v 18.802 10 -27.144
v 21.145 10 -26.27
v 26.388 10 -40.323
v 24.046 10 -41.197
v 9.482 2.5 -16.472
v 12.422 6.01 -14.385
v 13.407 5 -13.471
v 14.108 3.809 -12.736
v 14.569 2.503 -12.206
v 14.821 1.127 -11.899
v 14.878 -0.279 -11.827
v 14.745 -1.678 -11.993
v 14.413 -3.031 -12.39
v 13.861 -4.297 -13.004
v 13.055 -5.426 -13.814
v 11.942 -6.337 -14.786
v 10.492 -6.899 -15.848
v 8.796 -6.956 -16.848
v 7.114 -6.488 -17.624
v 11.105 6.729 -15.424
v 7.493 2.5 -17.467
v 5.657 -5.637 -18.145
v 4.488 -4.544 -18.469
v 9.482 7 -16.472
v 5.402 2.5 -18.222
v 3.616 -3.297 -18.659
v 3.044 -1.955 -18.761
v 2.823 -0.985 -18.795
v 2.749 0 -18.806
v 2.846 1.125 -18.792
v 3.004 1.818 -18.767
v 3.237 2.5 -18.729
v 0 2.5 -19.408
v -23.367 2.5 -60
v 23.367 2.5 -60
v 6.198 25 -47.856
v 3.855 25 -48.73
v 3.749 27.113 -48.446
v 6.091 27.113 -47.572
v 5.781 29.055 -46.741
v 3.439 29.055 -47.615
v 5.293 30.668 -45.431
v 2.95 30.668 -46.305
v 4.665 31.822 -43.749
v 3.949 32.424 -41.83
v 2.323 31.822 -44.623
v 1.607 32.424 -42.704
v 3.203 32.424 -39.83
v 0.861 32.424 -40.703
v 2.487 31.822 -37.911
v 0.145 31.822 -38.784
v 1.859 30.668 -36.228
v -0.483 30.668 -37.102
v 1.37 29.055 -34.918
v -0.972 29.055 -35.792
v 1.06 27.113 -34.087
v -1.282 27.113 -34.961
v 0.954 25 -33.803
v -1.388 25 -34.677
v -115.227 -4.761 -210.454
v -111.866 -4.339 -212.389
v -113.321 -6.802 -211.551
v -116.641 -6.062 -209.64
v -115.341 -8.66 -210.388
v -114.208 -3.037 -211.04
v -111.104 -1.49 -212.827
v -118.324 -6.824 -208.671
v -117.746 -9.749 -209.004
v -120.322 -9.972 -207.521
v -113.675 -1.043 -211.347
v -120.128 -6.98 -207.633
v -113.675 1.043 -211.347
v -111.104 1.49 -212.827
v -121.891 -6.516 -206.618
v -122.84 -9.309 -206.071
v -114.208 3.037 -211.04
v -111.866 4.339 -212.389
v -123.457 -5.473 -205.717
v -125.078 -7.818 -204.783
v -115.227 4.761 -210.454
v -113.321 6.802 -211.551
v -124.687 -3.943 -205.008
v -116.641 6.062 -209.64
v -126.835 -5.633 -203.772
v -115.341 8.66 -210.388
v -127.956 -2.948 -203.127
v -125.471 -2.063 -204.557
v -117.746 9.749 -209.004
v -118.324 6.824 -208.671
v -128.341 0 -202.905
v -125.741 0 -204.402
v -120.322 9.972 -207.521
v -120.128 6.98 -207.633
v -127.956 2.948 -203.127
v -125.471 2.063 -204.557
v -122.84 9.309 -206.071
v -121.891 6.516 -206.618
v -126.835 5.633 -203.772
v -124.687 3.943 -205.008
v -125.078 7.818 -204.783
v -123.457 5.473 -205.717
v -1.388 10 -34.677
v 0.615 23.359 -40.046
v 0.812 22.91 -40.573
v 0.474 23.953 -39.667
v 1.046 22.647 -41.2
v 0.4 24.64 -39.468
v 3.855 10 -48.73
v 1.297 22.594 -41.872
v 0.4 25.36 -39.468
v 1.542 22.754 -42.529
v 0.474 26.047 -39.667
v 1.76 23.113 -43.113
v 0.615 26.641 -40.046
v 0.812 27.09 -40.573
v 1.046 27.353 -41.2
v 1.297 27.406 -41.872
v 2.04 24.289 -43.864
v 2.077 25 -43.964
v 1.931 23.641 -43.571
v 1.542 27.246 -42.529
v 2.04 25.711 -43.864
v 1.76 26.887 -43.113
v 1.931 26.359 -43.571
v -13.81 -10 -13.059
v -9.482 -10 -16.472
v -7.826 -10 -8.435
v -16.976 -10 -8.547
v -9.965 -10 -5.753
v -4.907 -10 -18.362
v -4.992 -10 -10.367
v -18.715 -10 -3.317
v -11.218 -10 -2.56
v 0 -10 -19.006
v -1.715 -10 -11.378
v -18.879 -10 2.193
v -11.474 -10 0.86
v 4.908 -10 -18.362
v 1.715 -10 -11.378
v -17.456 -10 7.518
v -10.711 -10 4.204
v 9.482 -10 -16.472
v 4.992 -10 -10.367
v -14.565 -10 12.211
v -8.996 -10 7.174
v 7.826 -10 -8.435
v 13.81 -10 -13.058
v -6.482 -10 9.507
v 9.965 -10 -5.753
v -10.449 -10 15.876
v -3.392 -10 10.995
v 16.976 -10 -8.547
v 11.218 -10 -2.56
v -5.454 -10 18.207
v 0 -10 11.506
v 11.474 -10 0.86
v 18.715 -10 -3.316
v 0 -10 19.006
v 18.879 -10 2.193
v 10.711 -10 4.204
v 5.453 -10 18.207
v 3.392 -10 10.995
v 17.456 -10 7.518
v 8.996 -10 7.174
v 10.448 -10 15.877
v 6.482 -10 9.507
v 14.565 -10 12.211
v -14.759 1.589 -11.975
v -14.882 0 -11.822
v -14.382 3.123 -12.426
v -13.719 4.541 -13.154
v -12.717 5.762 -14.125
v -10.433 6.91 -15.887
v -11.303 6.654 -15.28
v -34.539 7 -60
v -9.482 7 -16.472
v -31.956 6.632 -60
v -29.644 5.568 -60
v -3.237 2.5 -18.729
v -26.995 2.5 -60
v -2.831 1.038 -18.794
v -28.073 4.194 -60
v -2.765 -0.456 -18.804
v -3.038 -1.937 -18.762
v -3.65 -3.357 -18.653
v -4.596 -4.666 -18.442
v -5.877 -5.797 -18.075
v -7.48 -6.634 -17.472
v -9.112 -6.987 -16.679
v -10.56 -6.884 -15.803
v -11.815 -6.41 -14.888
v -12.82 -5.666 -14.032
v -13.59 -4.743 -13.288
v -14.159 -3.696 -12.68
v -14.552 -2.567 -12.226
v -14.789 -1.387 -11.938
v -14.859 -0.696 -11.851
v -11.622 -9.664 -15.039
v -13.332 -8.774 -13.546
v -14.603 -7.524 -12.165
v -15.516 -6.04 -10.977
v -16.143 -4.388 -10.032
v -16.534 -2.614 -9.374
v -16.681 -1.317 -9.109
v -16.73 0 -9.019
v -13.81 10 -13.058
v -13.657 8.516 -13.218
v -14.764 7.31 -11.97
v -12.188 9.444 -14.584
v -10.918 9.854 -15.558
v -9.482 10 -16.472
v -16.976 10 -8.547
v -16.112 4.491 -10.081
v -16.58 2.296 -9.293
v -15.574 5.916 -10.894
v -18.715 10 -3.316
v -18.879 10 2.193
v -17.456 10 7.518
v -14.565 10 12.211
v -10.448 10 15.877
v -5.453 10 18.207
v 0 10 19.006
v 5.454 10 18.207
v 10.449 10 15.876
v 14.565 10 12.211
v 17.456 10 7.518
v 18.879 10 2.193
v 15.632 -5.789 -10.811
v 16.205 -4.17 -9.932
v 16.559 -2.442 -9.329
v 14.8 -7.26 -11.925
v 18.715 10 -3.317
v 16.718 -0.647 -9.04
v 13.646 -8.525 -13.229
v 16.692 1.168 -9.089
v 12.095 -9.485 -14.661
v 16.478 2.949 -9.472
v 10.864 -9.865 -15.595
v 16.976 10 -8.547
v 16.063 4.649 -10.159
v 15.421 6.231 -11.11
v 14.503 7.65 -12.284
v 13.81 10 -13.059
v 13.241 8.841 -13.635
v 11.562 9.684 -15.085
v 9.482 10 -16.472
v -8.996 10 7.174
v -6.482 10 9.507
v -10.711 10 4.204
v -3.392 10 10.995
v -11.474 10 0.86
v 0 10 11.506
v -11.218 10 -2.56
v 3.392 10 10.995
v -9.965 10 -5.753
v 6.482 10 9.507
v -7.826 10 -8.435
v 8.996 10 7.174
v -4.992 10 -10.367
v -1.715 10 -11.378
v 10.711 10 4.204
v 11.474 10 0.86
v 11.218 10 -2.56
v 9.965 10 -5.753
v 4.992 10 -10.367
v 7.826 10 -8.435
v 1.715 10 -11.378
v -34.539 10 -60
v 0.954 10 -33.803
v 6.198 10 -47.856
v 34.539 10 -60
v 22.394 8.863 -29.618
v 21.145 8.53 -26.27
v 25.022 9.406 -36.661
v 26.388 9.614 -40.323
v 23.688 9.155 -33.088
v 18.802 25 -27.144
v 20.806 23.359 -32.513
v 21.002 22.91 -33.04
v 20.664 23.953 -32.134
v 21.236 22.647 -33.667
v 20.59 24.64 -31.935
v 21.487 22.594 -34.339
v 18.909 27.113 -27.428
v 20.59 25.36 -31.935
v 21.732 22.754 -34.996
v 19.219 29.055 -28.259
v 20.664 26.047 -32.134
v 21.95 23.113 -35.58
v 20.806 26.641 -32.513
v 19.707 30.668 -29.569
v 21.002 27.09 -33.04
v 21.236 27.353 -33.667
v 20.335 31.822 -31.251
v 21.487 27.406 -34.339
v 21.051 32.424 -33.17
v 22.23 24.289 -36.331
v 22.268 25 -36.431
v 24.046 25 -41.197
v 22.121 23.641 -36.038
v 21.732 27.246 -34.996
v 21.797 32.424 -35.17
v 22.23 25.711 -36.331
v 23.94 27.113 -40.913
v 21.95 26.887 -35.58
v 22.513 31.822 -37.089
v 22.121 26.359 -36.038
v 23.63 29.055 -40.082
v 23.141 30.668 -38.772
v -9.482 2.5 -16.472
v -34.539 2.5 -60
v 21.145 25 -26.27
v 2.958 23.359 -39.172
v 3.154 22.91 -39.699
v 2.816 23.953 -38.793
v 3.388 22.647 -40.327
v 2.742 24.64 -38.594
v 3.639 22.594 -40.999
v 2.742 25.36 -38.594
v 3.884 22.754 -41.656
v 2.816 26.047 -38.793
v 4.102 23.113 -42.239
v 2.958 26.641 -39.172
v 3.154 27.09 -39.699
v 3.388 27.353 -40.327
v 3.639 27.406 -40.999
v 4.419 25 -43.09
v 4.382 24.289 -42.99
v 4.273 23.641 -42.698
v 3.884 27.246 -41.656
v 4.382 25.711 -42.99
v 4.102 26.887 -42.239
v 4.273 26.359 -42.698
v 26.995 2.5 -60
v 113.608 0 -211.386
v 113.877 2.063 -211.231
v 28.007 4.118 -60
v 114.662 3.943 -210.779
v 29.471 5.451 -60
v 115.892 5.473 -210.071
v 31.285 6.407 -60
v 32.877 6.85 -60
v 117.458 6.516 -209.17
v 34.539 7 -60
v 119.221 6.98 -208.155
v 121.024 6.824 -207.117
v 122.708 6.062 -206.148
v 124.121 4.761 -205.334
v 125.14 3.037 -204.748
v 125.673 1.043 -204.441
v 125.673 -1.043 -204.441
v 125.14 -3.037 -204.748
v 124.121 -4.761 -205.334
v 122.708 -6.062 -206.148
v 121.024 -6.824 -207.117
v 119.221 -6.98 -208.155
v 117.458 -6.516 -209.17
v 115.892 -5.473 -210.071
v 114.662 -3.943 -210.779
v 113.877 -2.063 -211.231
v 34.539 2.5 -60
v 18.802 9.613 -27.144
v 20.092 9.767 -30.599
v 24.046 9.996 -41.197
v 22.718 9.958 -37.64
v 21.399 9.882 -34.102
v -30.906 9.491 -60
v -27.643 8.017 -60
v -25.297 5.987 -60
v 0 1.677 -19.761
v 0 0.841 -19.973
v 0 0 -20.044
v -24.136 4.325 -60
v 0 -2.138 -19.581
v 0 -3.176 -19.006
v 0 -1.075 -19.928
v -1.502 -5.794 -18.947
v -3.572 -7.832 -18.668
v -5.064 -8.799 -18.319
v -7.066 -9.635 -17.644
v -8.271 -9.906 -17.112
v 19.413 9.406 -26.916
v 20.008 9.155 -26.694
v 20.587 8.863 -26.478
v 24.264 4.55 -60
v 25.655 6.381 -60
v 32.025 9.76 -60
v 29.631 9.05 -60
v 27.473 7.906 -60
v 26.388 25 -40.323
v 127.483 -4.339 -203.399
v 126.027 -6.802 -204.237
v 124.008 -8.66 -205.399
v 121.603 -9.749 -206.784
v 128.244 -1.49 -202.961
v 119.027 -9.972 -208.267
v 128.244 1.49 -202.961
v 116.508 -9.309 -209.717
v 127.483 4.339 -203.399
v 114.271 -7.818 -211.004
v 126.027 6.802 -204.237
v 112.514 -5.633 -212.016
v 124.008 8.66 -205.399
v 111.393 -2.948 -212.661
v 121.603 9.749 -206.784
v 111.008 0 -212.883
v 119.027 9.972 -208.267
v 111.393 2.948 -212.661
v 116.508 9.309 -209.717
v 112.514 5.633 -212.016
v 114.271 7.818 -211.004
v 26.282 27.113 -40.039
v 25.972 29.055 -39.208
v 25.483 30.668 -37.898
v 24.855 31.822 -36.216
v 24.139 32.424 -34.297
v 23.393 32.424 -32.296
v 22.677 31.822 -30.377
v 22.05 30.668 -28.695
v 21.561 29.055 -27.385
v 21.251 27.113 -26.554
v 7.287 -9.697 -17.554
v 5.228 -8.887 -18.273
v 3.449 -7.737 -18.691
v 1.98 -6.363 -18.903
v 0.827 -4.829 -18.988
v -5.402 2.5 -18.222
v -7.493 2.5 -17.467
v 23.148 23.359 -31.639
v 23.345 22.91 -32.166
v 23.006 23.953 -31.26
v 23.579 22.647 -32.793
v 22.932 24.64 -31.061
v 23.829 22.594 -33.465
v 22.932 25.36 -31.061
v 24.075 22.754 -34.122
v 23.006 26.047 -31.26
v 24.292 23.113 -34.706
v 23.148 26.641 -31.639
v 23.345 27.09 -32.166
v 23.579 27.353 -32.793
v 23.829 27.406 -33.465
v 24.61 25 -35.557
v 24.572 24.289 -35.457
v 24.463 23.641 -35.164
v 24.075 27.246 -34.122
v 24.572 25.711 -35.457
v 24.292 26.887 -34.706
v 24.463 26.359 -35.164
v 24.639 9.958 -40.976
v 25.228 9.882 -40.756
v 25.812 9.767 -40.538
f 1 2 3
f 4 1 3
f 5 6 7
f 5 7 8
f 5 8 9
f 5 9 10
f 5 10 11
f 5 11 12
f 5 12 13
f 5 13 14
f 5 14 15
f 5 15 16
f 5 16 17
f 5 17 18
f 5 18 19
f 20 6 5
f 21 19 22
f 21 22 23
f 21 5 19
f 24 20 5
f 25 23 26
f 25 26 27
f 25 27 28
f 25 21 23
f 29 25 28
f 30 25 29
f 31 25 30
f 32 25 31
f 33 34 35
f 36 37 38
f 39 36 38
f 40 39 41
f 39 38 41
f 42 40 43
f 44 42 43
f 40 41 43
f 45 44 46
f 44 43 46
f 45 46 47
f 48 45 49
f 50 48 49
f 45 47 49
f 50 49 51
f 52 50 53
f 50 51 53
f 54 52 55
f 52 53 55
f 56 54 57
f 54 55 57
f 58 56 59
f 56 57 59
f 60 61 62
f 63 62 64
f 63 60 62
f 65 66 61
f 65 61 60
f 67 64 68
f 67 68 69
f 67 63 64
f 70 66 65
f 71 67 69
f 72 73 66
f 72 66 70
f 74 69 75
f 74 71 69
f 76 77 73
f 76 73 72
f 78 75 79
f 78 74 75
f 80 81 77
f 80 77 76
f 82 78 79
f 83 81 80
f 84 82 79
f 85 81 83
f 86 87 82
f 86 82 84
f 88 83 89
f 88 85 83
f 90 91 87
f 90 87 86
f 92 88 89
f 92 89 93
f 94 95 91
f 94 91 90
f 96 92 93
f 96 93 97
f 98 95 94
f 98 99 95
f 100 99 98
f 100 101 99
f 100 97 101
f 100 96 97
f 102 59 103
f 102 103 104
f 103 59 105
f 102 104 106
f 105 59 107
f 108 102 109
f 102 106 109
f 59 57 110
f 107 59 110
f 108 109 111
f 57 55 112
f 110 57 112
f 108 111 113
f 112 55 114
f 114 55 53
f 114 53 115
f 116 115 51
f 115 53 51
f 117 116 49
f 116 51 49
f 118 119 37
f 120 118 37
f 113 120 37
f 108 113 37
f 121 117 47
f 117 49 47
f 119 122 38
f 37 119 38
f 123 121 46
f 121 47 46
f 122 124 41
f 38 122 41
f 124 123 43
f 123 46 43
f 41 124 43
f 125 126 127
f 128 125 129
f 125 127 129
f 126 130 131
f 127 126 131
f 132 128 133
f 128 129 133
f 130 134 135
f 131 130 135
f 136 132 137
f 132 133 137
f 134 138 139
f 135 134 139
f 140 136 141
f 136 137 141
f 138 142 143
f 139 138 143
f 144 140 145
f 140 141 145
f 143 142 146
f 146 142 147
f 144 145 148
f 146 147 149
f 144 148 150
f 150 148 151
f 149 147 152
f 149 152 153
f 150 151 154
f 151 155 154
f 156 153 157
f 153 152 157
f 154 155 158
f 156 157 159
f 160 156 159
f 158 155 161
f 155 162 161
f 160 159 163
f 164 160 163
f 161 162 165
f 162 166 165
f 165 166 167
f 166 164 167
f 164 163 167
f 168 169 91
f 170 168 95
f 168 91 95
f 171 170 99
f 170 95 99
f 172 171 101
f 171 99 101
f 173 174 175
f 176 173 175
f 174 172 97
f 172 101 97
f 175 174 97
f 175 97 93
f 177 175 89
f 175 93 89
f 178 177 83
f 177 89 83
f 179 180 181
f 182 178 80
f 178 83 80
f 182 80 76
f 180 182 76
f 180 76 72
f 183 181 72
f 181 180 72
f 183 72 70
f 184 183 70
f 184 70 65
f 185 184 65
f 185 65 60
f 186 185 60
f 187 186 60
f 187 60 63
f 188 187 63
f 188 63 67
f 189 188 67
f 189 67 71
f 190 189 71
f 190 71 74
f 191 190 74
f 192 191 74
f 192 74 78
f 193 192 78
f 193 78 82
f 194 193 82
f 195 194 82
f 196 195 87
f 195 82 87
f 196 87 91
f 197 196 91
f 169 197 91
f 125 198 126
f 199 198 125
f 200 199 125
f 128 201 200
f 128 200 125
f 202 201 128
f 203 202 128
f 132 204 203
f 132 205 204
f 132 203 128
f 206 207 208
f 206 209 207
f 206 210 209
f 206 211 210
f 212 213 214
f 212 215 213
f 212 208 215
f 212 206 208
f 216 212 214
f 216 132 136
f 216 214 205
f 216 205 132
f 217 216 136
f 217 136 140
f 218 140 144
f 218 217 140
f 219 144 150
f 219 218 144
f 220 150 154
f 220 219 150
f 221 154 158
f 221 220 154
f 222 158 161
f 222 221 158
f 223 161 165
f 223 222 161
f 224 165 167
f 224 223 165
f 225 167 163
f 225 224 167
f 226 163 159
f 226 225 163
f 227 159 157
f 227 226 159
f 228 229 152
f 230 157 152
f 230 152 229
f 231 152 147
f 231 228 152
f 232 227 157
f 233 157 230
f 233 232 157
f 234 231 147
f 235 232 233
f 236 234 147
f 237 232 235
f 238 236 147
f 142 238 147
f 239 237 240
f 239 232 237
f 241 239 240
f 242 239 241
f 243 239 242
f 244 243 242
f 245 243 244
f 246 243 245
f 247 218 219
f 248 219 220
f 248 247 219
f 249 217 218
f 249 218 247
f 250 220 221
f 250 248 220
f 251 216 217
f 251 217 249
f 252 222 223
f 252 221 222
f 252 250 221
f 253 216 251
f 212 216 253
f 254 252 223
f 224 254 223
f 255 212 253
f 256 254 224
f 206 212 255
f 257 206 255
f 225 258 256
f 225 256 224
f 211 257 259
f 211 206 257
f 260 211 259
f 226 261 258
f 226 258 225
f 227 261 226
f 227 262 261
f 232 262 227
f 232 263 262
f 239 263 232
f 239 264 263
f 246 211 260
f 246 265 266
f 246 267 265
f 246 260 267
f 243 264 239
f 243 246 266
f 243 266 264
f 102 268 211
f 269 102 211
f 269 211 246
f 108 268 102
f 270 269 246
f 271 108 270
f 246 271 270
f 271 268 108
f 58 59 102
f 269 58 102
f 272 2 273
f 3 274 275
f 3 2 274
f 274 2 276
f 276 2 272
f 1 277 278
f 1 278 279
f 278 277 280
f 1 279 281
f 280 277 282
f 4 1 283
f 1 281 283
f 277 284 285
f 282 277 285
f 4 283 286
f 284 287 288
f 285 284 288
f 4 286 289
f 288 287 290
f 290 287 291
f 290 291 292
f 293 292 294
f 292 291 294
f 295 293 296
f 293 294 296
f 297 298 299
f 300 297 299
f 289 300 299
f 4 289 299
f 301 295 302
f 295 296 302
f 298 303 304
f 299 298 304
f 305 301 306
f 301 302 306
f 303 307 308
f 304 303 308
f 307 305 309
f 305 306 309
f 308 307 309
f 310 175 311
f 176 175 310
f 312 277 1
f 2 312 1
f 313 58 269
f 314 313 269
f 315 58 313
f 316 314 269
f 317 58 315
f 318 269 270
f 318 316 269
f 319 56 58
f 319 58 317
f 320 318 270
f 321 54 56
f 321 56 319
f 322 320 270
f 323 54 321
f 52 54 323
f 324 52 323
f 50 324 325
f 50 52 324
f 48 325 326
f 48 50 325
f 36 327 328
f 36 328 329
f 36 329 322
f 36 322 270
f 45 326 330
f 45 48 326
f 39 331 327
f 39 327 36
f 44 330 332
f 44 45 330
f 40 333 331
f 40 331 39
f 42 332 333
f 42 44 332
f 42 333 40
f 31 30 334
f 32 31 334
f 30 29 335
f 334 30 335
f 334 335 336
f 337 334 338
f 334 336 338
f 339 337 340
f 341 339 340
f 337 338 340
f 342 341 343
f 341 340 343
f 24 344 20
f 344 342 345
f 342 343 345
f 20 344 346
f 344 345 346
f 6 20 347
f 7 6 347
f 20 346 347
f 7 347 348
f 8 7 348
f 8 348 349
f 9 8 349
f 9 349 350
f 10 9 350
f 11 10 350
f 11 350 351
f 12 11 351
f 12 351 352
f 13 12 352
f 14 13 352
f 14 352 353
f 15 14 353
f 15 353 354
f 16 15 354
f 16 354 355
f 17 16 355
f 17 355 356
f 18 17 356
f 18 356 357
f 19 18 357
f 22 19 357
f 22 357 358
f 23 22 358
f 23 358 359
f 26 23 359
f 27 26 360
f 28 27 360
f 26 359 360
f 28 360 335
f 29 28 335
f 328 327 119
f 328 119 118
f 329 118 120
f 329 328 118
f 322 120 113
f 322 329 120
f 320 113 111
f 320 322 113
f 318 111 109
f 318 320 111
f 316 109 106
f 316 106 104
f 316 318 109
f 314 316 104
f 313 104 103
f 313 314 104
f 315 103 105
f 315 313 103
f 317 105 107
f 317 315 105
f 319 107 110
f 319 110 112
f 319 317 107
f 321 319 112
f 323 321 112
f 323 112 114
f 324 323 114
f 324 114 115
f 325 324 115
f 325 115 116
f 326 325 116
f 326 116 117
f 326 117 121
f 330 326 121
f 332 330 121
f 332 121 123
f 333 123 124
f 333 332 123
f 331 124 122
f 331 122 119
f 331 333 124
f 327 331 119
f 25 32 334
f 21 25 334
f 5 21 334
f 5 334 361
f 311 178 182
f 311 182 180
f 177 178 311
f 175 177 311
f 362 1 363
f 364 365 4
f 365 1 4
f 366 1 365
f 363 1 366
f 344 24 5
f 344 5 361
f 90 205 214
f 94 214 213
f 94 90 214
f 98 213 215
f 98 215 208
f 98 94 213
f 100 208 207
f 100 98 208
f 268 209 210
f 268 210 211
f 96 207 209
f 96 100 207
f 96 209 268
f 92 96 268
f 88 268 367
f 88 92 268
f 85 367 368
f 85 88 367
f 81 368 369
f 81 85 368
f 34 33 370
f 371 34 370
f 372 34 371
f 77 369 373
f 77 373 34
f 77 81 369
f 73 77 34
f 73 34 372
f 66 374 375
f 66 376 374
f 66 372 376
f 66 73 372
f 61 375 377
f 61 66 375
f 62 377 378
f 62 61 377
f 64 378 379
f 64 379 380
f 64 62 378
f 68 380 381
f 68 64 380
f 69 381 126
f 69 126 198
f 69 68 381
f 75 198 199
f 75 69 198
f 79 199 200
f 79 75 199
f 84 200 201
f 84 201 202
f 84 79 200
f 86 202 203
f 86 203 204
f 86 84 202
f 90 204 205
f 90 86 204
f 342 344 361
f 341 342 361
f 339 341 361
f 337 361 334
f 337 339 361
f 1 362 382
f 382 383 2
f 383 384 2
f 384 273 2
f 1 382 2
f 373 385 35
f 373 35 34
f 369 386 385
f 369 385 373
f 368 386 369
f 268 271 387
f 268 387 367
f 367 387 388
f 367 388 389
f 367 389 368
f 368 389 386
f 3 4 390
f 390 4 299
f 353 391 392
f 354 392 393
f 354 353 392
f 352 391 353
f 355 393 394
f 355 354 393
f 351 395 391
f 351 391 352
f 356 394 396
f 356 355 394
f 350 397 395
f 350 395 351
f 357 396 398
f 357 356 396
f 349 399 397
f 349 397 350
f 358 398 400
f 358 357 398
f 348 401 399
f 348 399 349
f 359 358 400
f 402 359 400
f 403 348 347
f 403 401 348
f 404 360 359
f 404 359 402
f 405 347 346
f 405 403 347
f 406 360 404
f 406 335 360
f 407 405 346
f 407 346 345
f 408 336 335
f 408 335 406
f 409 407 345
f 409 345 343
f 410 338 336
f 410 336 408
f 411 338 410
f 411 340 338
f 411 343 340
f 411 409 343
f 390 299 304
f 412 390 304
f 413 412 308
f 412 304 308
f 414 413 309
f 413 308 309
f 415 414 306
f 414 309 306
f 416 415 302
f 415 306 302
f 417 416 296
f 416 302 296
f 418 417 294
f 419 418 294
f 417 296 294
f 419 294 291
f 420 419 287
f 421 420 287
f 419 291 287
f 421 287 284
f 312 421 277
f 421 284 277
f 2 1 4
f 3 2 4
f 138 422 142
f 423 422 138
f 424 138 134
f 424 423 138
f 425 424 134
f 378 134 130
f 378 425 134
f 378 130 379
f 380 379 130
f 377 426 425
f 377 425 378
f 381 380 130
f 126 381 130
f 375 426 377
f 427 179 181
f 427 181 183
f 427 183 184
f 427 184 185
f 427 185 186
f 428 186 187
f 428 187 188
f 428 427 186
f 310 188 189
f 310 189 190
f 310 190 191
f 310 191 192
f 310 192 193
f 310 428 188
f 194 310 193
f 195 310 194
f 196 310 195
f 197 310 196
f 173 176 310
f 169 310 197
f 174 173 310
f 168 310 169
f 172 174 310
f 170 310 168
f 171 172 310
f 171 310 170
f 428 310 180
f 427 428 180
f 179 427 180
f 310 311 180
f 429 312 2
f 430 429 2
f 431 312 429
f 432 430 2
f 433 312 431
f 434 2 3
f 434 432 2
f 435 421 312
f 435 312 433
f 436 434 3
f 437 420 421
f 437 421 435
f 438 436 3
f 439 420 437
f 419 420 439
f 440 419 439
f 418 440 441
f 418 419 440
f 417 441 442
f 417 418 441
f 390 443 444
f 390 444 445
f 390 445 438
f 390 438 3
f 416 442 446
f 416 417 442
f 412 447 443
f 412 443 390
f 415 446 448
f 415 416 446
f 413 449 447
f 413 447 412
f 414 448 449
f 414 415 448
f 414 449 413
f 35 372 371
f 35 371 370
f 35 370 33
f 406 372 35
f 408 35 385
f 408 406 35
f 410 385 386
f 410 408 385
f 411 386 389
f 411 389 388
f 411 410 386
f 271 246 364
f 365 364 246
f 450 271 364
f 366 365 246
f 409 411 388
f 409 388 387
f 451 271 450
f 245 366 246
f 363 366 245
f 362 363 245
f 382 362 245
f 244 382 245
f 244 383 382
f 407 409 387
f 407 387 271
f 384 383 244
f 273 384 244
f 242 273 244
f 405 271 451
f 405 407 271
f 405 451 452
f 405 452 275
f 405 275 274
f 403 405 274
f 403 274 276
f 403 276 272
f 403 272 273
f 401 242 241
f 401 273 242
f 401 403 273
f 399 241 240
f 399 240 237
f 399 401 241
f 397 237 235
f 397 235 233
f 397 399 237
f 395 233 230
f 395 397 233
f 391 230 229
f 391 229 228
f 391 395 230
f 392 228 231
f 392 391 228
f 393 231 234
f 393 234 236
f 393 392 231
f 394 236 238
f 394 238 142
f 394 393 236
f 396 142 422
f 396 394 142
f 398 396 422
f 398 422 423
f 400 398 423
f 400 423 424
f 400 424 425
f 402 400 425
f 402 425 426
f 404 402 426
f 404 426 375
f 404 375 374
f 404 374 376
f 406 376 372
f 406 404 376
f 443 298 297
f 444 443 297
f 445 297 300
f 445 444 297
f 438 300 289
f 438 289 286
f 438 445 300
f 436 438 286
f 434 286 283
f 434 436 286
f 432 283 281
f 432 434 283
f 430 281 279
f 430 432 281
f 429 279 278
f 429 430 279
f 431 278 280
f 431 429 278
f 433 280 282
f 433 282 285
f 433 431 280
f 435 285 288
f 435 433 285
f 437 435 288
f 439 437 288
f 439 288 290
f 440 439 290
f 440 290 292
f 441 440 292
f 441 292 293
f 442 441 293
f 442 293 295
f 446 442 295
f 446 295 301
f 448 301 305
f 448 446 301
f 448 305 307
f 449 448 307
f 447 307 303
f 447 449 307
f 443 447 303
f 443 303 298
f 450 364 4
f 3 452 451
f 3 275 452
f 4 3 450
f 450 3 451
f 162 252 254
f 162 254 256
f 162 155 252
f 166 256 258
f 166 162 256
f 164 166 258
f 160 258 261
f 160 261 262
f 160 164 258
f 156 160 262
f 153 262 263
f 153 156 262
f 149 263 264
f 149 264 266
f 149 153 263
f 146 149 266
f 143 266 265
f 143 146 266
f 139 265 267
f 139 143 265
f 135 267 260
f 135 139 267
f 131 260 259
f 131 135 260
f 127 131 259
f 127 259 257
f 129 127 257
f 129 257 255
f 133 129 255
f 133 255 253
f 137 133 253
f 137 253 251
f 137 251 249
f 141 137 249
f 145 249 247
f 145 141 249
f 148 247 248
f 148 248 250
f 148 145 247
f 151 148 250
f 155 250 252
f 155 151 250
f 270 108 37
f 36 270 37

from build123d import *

# Parameters (mm, degrees)
SKETCH1_R                = 19.0062
SKETCH1_R_2              = 11.5062
BOSS_EXTRUDE1_DEPTH      = 10
BOSS_EXTRUDE2_REACH      = 268.113
BOSS_EXTRUDE2_END_RADIUS = 19.0062
SKETCH5_R                = 10
SKETCH5_R_2              = 7
BOSS_EXTRUDE3_REACH      = 338.296
BOSS_EXTRUDE3_END_RADIUS = 19.0062
SKETCH6_R                = 10
SKETCH6_R_2              = 7
BOSS_EXTRUDE7_DEPTH      = 7.5
SKETCH14_R               = 2.413
BOSS_EXTRUDE8_DEPTH      = 12.025
SKETCH14_3_R             = 2.413
CUT_EXTRUDE1_DEPTH       = 9.525
SKETCH15_W               = 15
SKETCH15_H               = 2
BOSS_EXTRUDE9_DEPTH      = 2.5


with BuildPart() as part:
    # Sketch1 → Boss-Extrude1 (new, symmetric)
    with BuildSketch(Plane(origin=(0, 0, 0), x_dir=(1, 0, 0), z_dir=(0, 1, 0))):
        with Locations(Location((0, 0, 0), (0, 0, 270))):
            Circle(SKETCH1_R)
        with Locations(Location((0, 0, 0), (0, 0, 270))):
            Circle(SKETCH1_R_2, mode=Mode.SUBTRACT)
    extrude(amount=BOSS_EXTRUDE1_DEPTH, both=True)

    # Boss-Extrude2: up to this cylinder (the profile starts outside it)
    boss_extrude2_end = Plane(origin=(0, 0, 0), z_dir=(0, -1, 0)) * Cylinder(BOSS_EXTRUDE2_END_RADIUS, 575.2384, mode=Mode.PRIVATE)
    # Sketch5 → Boss-Extrude2 (add, up to the surface)
    with BuildSketch(Plane(origin=(119.67422463, 0, -207.893924576), x_dir=(0.86666261208593, 0, 0.4988946951135007), z_dir=(0.4988946951135007, 0, -0.86666261208593)), mode=Mode.PRIVATE) as boss_extrude2_sk1:
        with Locations(Location((0, 0, 0), (0, 0, 180))):
            Circle(SKETCH5_R)
        with Locations(Location((0, 0, 0), (0, 0, 180))):
            Circle(SKETCH5_R_2, mode=Mode.SUBTRACT)
    boss_extrude2_tool1 = extrude(boss_extrude2_sk1.sketch, amount=-BOSS_EXTRUDE2_REACH, mode=Mode.PRIVATE) - boss_extrude2_end
    add(boss_extrude2_tool1.solids().sort_by_distance((128.095722, 0, -203.046086))[0])

    # Boss-Extrude3: up to this cylinder (the profile starts outside it)
    boss_extrude3_end = Plane(origin=(0, 0, 0), z_dir=(0, -1, 0)) * Cylinder(BOSS_EXTRUDE3_END_RADIUS, 715.6044, mode=Mode.PRIVATE)
    # Sketch6 → Boss-Extrude3 (add, up to the surface)
    with BuildSketch(Plane(origin=(-119.67422463, 0, -207.893924576), x_dir=(-0.8666626120859262, 0, 0.49889469511350737), z_dir=(-0.4988946951135073, 0, -0.8666626120859261)), mode=Mode.PRIVATE) as boss_extrude3_sk1:
        Circle(SKETCH6_R)
        Circle(SKETCH6_R_2, mode=Mode.SUBTRACT)
    boss_extrude3_tool1 = extrude(boss_extrude3_sk1.sketch, amount=-BOSS_EXTRUDE3_REACH, mode=Mode.PRIVATE) - boss_extrude3_end
    add(boss_extrude3_tool1.solids().sort_by_distance((-111.252728, 0, -212.741763))[0])

    # Sketch13 → Boss-Extrude7 (add)
    with BuildSketch(Plane(origin=(0, 10, 0), x_dir=(1, 0, 0), z_dir=(0, 1, 0))):
        with BuildLine():
            Line((9.482092354, 16.471962938), (34.539025094, 60))
            Line((34.539025094, 60), (-34.539025094, 60))
            Line((-34.539025094, 60), (-9.482092354, 16.471962938))
            ThreePointArc((-9.482092354, 16.471962938), (0, 19.0062), (9.482092354, 16.471962938))
        make_face()
    extrude(amount=-BOSS_EXTRUDE7_DEPTH)

    # Sketch14 → Boss-Extrude8 (add, symmetric)
    with BuildSketch(Plane(origin=(-1.308996148, 0, -0.488385142), x_dir=(-0.34956145752045137, 0, 0.936913436458341), z_dir=(-0.9369134364583409, 0, -0.3495614575204513))):
        with BuildLine():
            Line((-47.003772086, 10), (-47.003772086, 25))
            ThreePointArc((-47.003772086, 25), (-39.503772086, 32.5), (-32.003772086, 25))
            Line((-32.003772086, 25), (-32.003772086, 10))
            Line((-32.003772086, 10), (-47.003772086, 10))
        make_face()
        with Locations(Location((-39.503772086, 25, 0), (0, 0, 180))):
            Circle(SKETCH14_R, mode=Mode.SUBTRACT)
    extrude(amount=BOSS_EXTRUDE8_DEPTH, both=True)

    # Sketch14<3> → Cut-Extrude1 (cut, symmetric)
    with BuildSketch(Plane(origin=(-1.308996148, 0, -0.488385142), x_dir=(-0.34956145752045137, 0, 0.936913436458341), z_dir=(-0.9369134364583409, 0, -0.3495614575204513))):
        with BuildLine():
            Line((-47.003772086, 10), (-47.003772086, 25))
            ThreePointArc((-47.003772086, 25), (-39.503772086, 32.5), (-32.003772086, 25))
            Line((-32.003772086, 25), (-32.003772086, 10))
            Line((-32.003772086, 10), (-47.003772086, 10))
        make_face()
        with Locations(Location((-39.503772086, 25, 0), (0, 0, 180))):
            Circle(SKETCH14_3_R, mode=Mode.SUBTRACT)
    extrude(amount=CUT_EXTRUDE1_DEPTH, both=True, mode=Mode.SUBTRACT)


with BuildPart() as cut_extrude1_piece_1:
    # of the separate pieces the step leaves, piece 1, a body of its own (cut_extrude1_pieces)
    add(part.part.solids().sort_by_distance((111.007598509, 0, -212.882871527))[0])

    # Sketch15 → Boss-Extrude9 (add)
    with BuildSketch(Plane(origin=(9.957387925, 0, 3.715091385), x_dir=(0.3495614575204513, 0, -0.936913436458341), z_dir=(0.936913436458341, 0, 0.3495614575204513))):
        with Locations((39.503772086, 9)):
            Rectangle(SKETCH15_W, SKETCH15_H)
    extrude(amount=-BOSS_EXTRUDE9_DEPTH)


with BuildPart() as cut_extrude1_piece_2:
    # of the separate pieces the step leaves, piece 2, a body of its own (cut_extrude1_pieces)
    add(part.part.solids().sort_by_distance((21.144673142, 10, -26.2696727))[0])


solid = Compound([cut_extrude1_piece_1.part, cut_extrude1_piece_2.part])
